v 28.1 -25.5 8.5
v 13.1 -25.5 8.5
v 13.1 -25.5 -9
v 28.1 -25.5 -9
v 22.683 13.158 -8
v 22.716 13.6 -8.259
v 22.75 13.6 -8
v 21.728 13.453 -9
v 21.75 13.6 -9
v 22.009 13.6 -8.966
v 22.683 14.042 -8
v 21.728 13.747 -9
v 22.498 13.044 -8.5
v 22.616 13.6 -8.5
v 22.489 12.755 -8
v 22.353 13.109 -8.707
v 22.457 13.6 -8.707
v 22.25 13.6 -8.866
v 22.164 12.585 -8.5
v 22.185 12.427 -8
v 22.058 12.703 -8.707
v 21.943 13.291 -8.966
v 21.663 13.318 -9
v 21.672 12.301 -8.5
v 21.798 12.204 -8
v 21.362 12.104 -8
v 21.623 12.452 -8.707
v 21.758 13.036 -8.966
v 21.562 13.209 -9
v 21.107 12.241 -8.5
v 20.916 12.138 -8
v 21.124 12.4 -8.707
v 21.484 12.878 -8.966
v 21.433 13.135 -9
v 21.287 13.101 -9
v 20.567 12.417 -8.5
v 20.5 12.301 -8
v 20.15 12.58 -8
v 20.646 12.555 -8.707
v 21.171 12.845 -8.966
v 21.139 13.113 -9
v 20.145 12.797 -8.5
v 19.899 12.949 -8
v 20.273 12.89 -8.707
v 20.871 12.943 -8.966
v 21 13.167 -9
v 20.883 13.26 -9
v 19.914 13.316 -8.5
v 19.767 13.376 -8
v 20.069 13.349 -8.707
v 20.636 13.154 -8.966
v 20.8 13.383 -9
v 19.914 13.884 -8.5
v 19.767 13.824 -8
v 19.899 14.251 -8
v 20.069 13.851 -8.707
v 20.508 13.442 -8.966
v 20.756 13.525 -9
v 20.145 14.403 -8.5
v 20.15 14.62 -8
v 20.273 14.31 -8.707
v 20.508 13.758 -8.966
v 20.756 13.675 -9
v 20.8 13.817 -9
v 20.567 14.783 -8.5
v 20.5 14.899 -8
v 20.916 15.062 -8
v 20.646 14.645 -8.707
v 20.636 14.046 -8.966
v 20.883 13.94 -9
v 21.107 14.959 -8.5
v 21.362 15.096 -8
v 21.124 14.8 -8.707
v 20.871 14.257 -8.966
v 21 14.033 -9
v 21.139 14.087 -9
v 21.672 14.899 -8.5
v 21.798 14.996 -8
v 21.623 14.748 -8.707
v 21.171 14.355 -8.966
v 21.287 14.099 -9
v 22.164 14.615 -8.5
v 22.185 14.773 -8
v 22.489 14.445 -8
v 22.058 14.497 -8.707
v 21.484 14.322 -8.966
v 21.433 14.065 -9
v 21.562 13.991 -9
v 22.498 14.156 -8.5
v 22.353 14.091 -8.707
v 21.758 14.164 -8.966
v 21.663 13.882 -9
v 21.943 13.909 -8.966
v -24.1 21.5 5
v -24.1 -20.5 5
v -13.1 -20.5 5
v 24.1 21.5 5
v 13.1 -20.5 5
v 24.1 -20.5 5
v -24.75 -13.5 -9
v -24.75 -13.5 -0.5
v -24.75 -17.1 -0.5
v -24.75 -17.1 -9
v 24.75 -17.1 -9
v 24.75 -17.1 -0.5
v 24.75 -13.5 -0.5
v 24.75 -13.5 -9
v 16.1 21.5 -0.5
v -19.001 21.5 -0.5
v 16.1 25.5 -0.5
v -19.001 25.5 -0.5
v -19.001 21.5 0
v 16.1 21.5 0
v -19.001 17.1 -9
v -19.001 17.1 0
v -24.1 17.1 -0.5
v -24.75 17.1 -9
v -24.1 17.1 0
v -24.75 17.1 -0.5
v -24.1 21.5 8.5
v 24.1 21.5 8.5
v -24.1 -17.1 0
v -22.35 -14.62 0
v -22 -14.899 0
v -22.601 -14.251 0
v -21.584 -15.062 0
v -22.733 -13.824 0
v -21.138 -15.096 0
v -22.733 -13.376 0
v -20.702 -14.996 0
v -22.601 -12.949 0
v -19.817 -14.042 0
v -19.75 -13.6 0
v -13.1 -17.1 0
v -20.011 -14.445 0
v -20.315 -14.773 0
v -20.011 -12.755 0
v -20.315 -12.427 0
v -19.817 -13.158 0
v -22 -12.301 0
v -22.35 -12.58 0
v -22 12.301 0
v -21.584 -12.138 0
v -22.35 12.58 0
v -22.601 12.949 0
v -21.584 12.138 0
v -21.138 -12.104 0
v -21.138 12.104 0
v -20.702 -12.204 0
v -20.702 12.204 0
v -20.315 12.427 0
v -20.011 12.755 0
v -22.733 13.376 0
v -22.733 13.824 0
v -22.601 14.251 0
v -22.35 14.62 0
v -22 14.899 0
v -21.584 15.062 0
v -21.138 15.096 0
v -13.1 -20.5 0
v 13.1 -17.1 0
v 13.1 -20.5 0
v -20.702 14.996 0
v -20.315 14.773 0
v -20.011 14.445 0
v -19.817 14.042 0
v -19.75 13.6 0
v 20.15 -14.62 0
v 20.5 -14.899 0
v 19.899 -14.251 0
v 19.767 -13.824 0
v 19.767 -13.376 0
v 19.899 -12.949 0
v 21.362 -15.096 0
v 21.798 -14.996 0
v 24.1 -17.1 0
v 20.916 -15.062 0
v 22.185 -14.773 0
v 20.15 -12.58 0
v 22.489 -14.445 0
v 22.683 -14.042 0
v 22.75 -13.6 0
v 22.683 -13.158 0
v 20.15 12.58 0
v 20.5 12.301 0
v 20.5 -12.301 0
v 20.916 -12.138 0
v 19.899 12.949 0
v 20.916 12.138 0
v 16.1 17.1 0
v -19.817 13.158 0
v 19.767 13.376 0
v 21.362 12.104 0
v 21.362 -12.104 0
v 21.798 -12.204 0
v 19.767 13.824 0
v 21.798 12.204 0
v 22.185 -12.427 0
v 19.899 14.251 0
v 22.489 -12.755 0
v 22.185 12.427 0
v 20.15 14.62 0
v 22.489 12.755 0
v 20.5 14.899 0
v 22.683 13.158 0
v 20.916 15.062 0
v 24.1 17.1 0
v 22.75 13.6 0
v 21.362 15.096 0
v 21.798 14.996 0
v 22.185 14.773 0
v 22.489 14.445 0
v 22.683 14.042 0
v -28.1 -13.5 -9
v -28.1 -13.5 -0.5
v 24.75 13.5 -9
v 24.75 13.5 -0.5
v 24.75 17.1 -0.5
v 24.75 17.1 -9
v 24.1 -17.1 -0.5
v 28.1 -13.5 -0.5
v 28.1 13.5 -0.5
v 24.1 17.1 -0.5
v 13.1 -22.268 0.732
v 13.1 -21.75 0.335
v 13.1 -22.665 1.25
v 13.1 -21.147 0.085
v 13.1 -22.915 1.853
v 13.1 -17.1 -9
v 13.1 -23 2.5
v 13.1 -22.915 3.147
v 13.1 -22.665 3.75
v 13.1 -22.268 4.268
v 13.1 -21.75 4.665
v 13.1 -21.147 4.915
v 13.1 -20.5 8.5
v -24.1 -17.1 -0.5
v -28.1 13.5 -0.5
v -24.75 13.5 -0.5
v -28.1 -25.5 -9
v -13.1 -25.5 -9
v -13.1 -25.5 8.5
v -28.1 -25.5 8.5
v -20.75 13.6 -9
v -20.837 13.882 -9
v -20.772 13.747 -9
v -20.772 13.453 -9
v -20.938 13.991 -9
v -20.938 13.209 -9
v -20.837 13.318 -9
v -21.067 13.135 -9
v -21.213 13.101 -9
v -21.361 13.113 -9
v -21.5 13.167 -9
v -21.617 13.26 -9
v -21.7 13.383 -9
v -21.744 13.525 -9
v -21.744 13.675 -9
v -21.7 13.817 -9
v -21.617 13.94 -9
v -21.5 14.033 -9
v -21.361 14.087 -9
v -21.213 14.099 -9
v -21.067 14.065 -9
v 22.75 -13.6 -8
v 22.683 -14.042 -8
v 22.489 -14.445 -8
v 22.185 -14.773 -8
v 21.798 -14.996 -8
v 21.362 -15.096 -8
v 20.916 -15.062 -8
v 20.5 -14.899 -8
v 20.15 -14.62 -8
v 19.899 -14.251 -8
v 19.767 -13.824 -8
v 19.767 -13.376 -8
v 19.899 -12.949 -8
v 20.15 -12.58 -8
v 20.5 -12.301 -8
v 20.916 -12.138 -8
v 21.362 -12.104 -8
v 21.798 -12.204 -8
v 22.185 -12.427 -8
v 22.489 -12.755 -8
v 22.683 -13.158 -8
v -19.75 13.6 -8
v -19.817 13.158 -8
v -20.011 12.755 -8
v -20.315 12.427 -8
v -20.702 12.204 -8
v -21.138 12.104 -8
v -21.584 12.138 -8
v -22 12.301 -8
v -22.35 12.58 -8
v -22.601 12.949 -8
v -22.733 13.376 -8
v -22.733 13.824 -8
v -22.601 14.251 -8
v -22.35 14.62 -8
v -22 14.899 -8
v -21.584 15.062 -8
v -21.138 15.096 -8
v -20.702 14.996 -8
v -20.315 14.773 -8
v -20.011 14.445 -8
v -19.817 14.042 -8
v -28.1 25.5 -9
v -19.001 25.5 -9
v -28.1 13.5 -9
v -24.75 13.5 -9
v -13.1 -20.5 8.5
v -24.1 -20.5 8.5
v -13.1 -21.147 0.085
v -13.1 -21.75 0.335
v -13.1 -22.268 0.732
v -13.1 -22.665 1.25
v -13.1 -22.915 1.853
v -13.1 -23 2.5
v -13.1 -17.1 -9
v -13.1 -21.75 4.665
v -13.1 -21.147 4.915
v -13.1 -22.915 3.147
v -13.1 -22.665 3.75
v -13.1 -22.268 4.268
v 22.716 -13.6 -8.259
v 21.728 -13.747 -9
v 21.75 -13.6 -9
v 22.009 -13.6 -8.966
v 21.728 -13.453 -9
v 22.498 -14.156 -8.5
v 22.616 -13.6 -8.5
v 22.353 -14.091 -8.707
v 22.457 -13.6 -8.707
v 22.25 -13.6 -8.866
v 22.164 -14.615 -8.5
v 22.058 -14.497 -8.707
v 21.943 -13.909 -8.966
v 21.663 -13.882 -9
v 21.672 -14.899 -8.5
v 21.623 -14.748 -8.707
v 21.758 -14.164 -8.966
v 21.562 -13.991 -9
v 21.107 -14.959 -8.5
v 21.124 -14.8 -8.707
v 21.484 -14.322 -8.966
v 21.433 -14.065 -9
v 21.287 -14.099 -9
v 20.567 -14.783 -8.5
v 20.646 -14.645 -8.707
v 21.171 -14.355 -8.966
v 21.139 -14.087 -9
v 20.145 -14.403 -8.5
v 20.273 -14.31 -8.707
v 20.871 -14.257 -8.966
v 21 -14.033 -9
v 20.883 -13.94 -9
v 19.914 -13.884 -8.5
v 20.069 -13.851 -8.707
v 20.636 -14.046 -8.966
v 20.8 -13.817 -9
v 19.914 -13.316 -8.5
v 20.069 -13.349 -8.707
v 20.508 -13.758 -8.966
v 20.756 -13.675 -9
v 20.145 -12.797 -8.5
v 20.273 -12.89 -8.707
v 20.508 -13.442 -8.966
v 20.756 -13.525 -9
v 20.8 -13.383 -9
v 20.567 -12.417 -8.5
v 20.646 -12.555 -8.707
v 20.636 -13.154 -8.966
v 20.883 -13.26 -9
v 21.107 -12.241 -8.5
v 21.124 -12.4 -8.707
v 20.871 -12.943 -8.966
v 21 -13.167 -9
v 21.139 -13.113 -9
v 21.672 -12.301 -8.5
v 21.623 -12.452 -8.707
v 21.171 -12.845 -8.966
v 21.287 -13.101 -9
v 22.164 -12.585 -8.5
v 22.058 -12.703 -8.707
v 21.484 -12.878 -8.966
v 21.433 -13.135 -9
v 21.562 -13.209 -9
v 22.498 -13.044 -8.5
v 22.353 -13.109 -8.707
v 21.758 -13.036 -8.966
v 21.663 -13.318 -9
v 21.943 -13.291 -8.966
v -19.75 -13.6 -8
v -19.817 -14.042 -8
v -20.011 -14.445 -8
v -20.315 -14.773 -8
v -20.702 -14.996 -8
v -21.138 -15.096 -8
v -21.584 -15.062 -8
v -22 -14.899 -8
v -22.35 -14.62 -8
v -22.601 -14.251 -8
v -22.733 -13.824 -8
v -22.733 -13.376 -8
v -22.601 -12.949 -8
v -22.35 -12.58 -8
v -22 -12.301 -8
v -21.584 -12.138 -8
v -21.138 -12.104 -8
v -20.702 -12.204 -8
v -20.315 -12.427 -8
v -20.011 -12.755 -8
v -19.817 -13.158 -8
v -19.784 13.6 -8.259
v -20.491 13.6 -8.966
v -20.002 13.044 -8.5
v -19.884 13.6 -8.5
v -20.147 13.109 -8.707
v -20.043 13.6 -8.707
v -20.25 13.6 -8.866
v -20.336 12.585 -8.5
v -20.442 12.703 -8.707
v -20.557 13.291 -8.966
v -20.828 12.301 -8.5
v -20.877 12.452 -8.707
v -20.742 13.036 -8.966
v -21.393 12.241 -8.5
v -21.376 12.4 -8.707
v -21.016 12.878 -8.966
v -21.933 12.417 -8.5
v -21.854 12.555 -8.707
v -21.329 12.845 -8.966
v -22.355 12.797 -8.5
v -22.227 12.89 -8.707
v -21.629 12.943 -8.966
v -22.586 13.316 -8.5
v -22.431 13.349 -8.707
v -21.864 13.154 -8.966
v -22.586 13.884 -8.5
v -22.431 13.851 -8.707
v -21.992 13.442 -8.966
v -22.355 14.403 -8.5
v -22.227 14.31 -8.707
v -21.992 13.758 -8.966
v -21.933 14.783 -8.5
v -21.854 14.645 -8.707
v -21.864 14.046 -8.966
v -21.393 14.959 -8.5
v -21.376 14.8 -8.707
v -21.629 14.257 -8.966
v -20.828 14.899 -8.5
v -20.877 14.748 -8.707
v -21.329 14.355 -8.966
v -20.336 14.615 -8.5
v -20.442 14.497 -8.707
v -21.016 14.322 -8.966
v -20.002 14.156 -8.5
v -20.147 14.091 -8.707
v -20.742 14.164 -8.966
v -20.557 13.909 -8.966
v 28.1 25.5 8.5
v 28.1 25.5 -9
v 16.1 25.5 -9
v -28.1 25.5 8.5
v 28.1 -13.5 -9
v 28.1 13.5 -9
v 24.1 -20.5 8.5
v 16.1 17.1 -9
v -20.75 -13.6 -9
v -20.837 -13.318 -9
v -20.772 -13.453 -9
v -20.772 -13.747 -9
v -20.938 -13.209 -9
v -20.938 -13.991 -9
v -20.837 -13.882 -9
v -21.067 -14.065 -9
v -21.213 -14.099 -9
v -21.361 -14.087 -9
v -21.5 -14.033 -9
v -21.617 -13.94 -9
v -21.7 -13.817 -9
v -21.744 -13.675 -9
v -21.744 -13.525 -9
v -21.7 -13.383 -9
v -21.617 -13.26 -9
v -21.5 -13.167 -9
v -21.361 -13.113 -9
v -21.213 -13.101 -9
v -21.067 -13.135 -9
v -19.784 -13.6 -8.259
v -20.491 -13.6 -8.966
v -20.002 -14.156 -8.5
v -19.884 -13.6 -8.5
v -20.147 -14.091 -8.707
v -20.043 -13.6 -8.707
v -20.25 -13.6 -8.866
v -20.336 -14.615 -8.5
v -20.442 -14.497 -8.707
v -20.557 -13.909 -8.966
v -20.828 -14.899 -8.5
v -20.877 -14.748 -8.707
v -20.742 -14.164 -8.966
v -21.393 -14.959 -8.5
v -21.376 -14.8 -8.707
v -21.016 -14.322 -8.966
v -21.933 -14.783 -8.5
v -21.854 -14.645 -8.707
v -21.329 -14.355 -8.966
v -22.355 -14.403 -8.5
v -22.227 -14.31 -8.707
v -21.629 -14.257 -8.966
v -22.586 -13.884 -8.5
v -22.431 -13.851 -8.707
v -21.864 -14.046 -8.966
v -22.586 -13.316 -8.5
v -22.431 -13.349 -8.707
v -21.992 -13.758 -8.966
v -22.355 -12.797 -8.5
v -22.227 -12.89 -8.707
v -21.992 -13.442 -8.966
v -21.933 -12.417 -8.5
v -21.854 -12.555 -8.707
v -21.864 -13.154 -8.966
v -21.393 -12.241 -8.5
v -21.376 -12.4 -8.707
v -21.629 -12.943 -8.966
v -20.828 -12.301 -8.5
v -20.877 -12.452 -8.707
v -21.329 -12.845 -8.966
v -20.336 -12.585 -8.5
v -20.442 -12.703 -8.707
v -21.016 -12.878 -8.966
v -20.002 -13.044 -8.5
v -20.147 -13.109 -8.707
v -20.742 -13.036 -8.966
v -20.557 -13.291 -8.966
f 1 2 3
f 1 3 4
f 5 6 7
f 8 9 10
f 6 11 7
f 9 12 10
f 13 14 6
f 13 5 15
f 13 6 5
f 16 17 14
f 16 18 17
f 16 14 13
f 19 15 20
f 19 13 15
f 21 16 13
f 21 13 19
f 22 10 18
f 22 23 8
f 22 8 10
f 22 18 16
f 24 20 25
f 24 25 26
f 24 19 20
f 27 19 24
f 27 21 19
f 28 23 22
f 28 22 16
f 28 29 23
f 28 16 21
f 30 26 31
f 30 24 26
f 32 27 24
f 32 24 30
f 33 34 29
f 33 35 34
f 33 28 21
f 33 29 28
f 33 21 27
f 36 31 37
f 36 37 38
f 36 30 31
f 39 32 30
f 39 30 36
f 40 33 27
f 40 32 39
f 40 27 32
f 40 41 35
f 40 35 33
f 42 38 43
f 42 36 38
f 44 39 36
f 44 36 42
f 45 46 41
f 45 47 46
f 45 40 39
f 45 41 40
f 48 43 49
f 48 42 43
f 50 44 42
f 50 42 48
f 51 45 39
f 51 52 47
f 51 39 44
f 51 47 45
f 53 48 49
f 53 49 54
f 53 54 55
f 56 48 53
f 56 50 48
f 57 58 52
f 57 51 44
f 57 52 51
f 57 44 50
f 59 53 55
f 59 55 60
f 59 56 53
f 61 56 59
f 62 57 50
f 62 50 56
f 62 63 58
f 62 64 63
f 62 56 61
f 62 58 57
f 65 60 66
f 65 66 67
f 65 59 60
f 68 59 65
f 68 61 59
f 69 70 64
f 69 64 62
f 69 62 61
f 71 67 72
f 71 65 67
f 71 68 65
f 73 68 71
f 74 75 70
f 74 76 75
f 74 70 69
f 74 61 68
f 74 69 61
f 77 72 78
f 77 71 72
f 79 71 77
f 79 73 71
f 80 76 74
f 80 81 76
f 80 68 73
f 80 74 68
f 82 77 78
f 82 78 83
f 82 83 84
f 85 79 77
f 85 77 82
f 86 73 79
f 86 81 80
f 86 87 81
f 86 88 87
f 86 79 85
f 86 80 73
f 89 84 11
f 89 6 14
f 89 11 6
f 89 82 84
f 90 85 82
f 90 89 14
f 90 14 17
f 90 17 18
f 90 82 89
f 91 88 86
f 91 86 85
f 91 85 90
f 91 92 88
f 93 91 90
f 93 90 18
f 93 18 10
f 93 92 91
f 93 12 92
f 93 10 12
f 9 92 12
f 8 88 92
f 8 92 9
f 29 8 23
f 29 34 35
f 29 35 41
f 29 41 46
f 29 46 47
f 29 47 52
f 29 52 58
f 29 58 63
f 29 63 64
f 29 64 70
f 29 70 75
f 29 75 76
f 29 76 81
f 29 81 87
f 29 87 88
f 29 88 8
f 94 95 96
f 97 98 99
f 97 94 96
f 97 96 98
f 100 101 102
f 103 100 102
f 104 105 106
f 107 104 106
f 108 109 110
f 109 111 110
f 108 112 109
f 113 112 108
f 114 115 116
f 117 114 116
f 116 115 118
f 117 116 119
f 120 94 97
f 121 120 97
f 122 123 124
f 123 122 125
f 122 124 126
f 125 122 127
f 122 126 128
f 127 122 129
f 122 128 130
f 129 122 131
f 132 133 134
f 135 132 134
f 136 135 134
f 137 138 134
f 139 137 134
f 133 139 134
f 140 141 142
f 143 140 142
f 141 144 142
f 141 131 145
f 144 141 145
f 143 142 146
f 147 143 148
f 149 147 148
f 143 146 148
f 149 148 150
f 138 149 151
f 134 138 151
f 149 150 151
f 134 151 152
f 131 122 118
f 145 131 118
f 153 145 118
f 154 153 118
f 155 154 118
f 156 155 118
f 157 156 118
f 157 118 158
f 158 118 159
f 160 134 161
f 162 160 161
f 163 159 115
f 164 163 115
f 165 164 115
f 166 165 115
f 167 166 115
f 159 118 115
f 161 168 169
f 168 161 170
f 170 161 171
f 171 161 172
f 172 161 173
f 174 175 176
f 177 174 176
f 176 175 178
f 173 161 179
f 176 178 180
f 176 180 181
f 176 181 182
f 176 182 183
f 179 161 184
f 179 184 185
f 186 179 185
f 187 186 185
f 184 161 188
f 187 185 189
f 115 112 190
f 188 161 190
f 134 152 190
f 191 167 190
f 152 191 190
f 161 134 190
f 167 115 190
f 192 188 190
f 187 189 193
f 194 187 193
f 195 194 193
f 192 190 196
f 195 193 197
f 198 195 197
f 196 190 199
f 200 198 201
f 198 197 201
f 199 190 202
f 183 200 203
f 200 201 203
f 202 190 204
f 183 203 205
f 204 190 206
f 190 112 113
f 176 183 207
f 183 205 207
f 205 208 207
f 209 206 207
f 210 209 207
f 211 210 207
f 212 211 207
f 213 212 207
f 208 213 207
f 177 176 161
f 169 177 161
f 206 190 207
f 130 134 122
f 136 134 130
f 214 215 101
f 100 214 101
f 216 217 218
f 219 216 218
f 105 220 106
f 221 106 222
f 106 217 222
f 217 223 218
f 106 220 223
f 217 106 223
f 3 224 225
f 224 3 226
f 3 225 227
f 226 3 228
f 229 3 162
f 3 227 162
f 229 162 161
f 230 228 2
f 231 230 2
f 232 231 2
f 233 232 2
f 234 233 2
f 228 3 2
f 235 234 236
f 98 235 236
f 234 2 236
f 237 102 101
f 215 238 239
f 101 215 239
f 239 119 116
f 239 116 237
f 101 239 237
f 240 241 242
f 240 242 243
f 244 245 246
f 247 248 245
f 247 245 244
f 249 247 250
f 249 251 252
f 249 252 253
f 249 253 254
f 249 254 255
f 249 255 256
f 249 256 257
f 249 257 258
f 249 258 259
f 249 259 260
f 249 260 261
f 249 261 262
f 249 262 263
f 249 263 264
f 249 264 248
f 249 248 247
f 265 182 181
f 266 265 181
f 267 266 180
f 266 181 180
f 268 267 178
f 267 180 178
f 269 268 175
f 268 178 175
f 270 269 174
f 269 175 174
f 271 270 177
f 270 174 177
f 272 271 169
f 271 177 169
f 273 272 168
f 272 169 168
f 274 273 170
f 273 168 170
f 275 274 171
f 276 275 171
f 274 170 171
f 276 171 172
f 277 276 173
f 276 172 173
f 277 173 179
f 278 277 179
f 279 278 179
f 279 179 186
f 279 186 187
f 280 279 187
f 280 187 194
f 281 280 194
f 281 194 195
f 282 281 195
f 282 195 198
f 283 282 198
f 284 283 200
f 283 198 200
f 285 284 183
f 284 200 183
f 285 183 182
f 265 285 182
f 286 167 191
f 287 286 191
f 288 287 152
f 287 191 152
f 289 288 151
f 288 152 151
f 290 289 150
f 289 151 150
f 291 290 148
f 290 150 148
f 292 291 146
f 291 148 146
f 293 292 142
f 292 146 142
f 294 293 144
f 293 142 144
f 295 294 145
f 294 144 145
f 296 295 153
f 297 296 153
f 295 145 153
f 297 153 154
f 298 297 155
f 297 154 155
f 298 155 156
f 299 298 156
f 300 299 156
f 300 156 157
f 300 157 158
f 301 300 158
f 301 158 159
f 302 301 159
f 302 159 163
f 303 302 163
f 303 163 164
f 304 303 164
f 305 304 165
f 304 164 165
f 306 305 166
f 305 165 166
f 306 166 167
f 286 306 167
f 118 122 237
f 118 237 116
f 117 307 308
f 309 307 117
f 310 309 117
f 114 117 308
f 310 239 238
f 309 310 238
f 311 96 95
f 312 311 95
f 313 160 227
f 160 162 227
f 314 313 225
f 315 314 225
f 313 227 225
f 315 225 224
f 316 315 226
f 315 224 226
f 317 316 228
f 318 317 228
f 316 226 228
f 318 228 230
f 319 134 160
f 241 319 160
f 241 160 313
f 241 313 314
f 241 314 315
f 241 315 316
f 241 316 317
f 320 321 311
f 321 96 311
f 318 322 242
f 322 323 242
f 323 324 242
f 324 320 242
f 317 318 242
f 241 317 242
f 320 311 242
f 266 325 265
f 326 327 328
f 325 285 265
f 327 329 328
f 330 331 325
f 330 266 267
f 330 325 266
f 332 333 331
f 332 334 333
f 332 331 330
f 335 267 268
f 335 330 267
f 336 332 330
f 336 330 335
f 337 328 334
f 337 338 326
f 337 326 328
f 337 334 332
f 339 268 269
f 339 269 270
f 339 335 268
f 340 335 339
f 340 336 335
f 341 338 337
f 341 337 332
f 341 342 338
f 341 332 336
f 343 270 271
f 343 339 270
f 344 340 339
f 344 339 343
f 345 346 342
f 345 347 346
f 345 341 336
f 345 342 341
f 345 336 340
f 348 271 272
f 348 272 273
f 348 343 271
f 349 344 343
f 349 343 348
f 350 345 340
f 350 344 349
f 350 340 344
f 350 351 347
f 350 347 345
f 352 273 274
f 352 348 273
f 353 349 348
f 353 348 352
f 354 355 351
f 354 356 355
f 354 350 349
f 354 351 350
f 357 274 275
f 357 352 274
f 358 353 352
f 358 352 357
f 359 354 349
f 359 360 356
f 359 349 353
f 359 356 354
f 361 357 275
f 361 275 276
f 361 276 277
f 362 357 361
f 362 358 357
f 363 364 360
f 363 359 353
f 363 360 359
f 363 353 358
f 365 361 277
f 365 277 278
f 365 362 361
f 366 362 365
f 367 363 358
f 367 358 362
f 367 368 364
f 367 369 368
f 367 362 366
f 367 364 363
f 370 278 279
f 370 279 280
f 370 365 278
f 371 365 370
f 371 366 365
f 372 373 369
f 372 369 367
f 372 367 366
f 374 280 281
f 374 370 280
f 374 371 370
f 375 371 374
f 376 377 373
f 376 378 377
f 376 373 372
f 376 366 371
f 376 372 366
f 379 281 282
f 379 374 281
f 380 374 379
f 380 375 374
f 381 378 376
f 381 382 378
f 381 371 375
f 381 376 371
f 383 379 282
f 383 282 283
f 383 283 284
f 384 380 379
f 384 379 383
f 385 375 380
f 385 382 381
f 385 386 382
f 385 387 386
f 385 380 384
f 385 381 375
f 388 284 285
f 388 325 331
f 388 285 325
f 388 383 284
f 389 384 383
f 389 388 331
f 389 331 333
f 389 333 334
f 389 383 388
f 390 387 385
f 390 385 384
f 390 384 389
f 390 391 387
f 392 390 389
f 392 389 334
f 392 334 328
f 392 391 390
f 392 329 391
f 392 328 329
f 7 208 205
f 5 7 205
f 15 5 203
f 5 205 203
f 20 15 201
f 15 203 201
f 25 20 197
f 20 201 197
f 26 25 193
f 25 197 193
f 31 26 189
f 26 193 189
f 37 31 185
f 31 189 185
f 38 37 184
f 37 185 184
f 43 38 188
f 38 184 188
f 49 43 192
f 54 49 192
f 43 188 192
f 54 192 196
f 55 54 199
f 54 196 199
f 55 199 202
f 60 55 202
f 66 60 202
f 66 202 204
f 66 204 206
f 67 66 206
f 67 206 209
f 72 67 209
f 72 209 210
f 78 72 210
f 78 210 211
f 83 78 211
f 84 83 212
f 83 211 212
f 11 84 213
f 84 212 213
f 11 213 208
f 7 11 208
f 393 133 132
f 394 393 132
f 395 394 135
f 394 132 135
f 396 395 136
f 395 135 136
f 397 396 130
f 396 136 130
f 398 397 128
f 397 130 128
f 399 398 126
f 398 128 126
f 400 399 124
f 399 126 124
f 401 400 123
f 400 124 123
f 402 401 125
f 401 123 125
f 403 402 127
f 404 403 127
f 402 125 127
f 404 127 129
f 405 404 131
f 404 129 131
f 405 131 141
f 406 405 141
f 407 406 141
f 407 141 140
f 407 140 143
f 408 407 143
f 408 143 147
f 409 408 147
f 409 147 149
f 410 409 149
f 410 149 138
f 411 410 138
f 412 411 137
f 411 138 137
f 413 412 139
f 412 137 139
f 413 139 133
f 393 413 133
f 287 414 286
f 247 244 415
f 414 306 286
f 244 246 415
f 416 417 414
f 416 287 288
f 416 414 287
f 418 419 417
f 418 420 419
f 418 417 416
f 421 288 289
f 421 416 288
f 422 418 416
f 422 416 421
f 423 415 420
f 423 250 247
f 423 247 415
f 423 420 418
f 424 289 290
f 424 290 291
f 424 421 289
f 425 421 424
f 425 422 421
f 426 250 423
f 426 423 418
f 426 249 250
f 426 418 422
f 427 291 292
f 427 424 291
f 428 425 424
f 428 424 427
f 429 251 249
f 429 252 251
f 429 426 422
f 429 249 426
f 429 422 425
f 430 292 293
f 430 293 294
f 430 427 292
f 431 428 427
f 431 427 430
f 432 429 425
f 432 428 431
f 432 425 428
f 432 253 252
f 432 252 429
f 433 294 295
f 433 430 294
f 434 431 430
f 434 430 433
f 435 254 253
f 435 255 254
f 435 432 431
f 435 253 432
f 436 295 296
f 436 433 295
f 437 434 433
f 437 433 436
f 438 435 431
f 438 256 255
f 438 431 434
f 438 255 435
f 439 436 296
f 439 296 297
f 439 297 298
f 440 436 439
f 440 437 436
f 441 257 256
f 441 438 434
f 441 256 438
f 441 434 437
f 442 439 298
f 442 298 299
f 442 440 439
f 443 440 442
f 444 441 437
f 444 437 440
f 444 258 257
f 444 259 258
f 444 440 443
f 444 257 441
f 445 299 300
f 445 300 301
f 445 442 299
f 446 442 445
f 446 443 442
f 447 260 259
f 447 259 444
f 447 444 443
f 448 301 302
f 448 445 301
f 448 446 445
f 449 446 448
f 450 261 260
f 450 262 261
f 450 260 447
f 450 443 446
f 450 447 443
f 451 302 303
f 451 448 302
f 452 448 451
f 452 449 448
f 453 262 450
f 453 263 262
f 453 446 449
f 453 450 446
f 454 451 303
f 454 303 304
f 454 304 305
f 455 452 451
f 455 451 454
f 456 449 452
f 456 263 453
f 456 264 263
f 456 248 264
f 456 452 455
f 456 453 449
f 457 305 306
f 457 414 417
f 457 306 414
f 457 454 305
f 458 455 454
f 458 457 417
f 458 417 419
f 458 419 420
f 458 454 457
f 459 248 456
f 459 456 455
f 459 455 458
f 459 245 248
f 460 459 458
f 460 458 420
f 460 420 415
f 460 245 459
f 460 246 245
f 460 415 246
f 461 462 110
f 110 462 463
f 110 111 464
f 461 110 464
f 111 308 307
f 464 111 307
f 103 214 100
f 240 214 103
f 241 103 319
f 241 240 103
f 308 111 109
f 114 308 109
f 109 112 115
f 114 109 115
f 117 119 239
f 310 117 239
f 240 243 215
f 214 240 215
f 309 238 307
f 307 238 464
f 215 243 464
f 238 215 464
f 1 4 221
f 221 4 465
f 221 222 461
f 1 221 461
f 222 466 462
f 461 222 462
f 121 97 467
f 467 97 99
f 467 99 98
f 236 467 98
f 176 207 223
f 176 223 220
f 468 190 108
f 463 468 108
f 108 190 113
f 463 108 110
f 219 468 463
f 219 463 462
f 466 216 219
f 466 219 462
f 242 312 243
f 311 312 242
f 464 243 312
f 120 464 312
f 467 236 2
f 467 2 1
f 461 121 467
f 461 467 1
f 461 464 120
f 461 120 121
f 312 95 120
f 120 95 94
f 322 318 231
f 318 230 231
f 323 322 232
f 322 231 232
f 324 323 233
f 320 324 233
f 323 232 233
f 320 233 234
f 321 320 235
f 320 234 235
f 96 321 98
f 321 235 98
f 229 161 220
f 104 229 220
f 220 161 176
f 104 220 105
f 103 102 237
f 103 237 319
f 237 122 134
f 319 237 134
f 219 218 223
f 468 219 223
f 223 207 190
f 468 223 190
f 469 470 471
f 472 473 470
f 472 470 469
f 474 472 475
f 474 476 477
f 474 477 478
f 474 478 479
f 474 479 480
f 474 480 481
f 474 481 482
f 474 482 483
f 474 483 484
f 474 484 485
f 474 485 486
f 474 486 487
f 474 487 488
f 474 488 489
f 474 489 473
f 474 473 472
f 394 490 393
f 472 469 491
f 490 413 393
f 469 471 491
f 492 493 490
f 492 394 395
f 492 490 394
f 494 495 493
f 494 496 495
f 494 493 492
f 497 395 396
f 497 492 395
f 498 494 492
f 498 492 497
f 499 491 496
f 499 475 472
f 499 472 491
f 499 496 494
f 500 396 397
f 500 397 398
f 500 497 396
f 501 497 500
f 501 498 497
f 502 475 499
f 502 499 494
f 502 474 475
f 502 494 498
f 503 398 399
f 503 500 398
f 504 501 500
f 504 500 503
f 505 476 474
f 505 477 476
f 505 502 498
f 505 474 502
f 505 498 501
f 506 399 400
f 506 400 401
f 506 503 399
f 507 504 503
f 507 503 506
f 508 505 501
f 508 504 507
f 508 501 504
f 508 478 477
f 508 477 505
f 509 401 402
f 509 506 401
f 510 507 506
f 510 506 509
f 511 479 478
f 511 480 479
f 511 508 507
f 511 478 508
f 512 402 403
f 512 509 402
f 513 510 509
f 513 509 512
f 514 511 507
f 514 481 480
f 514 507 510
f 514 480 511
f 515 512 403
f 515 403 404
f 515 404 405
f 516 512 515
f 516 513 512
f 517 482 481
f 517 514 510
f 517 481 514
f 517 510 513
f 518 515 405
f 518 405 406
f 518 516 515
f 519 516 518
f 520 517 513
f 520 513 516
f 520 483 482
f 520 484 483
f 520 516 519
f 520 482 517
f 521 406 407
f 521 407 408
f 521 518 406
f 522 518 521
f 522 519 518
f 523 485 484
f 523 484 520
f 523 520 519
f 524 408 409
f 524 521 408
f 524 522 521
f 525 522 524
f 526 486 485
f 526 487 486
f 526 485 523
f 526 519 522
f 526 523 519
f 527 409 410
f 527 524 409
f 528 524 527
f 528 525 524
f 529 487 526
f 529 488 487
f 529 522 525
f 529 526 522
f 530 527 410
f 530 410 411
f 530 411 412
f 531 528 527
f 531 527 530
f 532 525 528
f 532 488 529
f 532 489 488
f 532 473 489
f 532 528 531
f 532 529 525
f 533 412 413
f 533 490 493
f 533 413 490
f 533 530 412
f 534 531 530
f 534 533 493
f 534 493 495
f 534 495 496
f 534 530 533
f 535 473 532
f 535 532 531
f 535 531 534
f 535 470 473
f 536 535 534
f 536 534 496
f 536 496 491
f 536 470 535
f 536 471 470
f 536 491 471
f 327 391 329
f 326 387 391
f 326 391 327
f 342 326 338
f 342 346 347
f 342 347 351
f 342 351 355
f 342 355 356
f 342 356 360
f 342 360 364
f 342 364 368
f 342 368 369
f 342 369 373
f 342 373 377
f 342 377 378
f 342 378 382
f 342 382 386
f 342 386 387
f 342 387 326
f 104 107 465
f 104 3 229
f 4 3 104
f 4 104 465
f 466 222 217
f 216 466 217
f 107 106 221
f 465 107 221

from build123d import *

# Parameters (mm, degrees)
F0_W     = 26.2
F0_H     = 2.5
F1_DEPTH = 5
F2_DEPTH = 8.5
F4_DEPTH = 9
F3_R     = 1.5
F5_DEPTH = 9
F6_R     = 1
F7_R     = 2.49999


# Not quite as in the source:
# - a fillet or chamfer is up to 0.001 mm smaller than in the source, because OpenCascade refuses the exact size


with BuildPart() as f1:
    # F0 (on Top) → F1 (new body)
    with BuildSketch(Plane.XY):
        Polygon((13.1, -20.5), (23.1, -20.5), (24.1, -20.5), (24.1, 21.5), (-24.1, 21.5), (-24.1, -20.5), (-23.1, -20.5), (-13.1, -20.5), align=None)
        with Locations((0, -21.75)):
            Rectangle(F0_W, F0_H)
        Polygon((-13.1, -23), (-13.1, -20.5), (-23.1, -20.5), (-24.1, -20.5), (-28.1, -20.5), (-28.1, -25.5), (-13.1, -25.5), align=None)
    extrude(amount=F1_DEPTH)

    # F0 (on Top) → F2 (join)
    with BuildSketch(Plane.XY):
        Polygon((24.1, -20.5), (23.1, -20.5), (13.1, -20.5), (13.1, -23), (13.1, -25.5), (28.1, -25.5), (28.1, -20.5), align=None)
        Polygon((24.1, 21.5), (24.1, -20.5), (28.1, -20.5), (28.1, 25.5), (-28.1, 25.5), (-28.1, -20.5), (-24.1, -20.5), (-24.1, 21.5), align=None)
        Polygon((-13.1, -23), (-13.1, -20.5), (-23.1, -20.5), (-24.1, -20.5), (-28.1, -20.5), (-28.1, -25.5), (-13.1, -25.5), align=None)
    extrude(amount=F2_DEPTH)

    # F3 (on face) → F4 (join)
    with BuildSketch(Plane(origin=(0, 0, 0), x_dir=(1, 0, 0), z_dir=(0, 0, -1))):
        Polygon((-28.1, 13.5), (-24.75, 13.5), (-24.75, 17.1), (-13.1, 17.1), (-13.1, 23), (-13.1, 25.5), (-28.1, 25.5), align=None)
        Polygon((-19.0010517836, -25.5), (-19.0010517836, -17.1), (-24.75, -17.1), (-24.75, -13.5), (-28.1, -13.5), (-28.1, -25.5), align=None)
        Polygon((24.75, -13.5), (24.75, -17.1), (16.1, -17.1), (16.1, -25.5), (28.1, -25.5), (28.1, -13.5), align=None)
        Polygon((24.75, 17.1), (24.75, 13.5), (28.1, 13.5), (28.1, 25.5), (13.1, 25.5), (13.1, 23), (13.1, 17.1), align=None)
    extrude(amount=F4_DEPTH)

    # F3 (on face) + F2_face1 (on face) → F5 (join)
    with BuildSketch(Plane(origin=(0, 0, 0), x_dir=(1, 0, 0), z_dir=(0, 0, -1))):
        with Locations((-21.25, 13.6)):
            Circle(F3_R)
        with Locations((-21.25, -13.6)):
            Circle(F3_R)
        with Locations((21.25, -13.6)):
            Circle(F3_R)
        with Locations((21.25, 13.6)):
            Circle(F3_R)
    with BuildSketch(Plane(origin=(0, 2.8148564997, 8.5), x_dir=(1, 0, 0), z_dir=(0, 0, 1))):
        Polygon((24.1, -23.3148564997), (13.1, -23.3148564997), (13.1, -28.3148564997), (28.1, -28.3148564997), (28.1, 22.6851435003), (-28.1, 22.6851435003), (-28.1, -28.3148564997), (-13.1, -28.3148564997), (-13.1, -23.3148564997), (-24.1, -23.3148564997), (-24.1, 18.6851435003), (24.1, 18.6851435003), align=None)
    extrude(amount=F5_DEPTH, dir=(0, 0, -1))

    # F6
    f6_edges = [f1.edges().sort_by_distance(p)[0] for p in [
        (-22.75, 13.6, -9),
        (-22.75, -13.6, -9),
        (19.75, -13.6, -9),
        (19.75, 13.6, -9),
    ]]
    fillet(f6_edges, radius=F6_R)

    # F7 (radius 2.5 in the source; OpenCascade refuses exactly that, so slightly less here)
    f7_edges = [f1.edges().sort_by_distance(p)[0] for p in [
        (0, -23, 0),
        (0, -23, 5),
    ]]
    fillet(f7_edges, radius=F7_R)


solid = f1.part
